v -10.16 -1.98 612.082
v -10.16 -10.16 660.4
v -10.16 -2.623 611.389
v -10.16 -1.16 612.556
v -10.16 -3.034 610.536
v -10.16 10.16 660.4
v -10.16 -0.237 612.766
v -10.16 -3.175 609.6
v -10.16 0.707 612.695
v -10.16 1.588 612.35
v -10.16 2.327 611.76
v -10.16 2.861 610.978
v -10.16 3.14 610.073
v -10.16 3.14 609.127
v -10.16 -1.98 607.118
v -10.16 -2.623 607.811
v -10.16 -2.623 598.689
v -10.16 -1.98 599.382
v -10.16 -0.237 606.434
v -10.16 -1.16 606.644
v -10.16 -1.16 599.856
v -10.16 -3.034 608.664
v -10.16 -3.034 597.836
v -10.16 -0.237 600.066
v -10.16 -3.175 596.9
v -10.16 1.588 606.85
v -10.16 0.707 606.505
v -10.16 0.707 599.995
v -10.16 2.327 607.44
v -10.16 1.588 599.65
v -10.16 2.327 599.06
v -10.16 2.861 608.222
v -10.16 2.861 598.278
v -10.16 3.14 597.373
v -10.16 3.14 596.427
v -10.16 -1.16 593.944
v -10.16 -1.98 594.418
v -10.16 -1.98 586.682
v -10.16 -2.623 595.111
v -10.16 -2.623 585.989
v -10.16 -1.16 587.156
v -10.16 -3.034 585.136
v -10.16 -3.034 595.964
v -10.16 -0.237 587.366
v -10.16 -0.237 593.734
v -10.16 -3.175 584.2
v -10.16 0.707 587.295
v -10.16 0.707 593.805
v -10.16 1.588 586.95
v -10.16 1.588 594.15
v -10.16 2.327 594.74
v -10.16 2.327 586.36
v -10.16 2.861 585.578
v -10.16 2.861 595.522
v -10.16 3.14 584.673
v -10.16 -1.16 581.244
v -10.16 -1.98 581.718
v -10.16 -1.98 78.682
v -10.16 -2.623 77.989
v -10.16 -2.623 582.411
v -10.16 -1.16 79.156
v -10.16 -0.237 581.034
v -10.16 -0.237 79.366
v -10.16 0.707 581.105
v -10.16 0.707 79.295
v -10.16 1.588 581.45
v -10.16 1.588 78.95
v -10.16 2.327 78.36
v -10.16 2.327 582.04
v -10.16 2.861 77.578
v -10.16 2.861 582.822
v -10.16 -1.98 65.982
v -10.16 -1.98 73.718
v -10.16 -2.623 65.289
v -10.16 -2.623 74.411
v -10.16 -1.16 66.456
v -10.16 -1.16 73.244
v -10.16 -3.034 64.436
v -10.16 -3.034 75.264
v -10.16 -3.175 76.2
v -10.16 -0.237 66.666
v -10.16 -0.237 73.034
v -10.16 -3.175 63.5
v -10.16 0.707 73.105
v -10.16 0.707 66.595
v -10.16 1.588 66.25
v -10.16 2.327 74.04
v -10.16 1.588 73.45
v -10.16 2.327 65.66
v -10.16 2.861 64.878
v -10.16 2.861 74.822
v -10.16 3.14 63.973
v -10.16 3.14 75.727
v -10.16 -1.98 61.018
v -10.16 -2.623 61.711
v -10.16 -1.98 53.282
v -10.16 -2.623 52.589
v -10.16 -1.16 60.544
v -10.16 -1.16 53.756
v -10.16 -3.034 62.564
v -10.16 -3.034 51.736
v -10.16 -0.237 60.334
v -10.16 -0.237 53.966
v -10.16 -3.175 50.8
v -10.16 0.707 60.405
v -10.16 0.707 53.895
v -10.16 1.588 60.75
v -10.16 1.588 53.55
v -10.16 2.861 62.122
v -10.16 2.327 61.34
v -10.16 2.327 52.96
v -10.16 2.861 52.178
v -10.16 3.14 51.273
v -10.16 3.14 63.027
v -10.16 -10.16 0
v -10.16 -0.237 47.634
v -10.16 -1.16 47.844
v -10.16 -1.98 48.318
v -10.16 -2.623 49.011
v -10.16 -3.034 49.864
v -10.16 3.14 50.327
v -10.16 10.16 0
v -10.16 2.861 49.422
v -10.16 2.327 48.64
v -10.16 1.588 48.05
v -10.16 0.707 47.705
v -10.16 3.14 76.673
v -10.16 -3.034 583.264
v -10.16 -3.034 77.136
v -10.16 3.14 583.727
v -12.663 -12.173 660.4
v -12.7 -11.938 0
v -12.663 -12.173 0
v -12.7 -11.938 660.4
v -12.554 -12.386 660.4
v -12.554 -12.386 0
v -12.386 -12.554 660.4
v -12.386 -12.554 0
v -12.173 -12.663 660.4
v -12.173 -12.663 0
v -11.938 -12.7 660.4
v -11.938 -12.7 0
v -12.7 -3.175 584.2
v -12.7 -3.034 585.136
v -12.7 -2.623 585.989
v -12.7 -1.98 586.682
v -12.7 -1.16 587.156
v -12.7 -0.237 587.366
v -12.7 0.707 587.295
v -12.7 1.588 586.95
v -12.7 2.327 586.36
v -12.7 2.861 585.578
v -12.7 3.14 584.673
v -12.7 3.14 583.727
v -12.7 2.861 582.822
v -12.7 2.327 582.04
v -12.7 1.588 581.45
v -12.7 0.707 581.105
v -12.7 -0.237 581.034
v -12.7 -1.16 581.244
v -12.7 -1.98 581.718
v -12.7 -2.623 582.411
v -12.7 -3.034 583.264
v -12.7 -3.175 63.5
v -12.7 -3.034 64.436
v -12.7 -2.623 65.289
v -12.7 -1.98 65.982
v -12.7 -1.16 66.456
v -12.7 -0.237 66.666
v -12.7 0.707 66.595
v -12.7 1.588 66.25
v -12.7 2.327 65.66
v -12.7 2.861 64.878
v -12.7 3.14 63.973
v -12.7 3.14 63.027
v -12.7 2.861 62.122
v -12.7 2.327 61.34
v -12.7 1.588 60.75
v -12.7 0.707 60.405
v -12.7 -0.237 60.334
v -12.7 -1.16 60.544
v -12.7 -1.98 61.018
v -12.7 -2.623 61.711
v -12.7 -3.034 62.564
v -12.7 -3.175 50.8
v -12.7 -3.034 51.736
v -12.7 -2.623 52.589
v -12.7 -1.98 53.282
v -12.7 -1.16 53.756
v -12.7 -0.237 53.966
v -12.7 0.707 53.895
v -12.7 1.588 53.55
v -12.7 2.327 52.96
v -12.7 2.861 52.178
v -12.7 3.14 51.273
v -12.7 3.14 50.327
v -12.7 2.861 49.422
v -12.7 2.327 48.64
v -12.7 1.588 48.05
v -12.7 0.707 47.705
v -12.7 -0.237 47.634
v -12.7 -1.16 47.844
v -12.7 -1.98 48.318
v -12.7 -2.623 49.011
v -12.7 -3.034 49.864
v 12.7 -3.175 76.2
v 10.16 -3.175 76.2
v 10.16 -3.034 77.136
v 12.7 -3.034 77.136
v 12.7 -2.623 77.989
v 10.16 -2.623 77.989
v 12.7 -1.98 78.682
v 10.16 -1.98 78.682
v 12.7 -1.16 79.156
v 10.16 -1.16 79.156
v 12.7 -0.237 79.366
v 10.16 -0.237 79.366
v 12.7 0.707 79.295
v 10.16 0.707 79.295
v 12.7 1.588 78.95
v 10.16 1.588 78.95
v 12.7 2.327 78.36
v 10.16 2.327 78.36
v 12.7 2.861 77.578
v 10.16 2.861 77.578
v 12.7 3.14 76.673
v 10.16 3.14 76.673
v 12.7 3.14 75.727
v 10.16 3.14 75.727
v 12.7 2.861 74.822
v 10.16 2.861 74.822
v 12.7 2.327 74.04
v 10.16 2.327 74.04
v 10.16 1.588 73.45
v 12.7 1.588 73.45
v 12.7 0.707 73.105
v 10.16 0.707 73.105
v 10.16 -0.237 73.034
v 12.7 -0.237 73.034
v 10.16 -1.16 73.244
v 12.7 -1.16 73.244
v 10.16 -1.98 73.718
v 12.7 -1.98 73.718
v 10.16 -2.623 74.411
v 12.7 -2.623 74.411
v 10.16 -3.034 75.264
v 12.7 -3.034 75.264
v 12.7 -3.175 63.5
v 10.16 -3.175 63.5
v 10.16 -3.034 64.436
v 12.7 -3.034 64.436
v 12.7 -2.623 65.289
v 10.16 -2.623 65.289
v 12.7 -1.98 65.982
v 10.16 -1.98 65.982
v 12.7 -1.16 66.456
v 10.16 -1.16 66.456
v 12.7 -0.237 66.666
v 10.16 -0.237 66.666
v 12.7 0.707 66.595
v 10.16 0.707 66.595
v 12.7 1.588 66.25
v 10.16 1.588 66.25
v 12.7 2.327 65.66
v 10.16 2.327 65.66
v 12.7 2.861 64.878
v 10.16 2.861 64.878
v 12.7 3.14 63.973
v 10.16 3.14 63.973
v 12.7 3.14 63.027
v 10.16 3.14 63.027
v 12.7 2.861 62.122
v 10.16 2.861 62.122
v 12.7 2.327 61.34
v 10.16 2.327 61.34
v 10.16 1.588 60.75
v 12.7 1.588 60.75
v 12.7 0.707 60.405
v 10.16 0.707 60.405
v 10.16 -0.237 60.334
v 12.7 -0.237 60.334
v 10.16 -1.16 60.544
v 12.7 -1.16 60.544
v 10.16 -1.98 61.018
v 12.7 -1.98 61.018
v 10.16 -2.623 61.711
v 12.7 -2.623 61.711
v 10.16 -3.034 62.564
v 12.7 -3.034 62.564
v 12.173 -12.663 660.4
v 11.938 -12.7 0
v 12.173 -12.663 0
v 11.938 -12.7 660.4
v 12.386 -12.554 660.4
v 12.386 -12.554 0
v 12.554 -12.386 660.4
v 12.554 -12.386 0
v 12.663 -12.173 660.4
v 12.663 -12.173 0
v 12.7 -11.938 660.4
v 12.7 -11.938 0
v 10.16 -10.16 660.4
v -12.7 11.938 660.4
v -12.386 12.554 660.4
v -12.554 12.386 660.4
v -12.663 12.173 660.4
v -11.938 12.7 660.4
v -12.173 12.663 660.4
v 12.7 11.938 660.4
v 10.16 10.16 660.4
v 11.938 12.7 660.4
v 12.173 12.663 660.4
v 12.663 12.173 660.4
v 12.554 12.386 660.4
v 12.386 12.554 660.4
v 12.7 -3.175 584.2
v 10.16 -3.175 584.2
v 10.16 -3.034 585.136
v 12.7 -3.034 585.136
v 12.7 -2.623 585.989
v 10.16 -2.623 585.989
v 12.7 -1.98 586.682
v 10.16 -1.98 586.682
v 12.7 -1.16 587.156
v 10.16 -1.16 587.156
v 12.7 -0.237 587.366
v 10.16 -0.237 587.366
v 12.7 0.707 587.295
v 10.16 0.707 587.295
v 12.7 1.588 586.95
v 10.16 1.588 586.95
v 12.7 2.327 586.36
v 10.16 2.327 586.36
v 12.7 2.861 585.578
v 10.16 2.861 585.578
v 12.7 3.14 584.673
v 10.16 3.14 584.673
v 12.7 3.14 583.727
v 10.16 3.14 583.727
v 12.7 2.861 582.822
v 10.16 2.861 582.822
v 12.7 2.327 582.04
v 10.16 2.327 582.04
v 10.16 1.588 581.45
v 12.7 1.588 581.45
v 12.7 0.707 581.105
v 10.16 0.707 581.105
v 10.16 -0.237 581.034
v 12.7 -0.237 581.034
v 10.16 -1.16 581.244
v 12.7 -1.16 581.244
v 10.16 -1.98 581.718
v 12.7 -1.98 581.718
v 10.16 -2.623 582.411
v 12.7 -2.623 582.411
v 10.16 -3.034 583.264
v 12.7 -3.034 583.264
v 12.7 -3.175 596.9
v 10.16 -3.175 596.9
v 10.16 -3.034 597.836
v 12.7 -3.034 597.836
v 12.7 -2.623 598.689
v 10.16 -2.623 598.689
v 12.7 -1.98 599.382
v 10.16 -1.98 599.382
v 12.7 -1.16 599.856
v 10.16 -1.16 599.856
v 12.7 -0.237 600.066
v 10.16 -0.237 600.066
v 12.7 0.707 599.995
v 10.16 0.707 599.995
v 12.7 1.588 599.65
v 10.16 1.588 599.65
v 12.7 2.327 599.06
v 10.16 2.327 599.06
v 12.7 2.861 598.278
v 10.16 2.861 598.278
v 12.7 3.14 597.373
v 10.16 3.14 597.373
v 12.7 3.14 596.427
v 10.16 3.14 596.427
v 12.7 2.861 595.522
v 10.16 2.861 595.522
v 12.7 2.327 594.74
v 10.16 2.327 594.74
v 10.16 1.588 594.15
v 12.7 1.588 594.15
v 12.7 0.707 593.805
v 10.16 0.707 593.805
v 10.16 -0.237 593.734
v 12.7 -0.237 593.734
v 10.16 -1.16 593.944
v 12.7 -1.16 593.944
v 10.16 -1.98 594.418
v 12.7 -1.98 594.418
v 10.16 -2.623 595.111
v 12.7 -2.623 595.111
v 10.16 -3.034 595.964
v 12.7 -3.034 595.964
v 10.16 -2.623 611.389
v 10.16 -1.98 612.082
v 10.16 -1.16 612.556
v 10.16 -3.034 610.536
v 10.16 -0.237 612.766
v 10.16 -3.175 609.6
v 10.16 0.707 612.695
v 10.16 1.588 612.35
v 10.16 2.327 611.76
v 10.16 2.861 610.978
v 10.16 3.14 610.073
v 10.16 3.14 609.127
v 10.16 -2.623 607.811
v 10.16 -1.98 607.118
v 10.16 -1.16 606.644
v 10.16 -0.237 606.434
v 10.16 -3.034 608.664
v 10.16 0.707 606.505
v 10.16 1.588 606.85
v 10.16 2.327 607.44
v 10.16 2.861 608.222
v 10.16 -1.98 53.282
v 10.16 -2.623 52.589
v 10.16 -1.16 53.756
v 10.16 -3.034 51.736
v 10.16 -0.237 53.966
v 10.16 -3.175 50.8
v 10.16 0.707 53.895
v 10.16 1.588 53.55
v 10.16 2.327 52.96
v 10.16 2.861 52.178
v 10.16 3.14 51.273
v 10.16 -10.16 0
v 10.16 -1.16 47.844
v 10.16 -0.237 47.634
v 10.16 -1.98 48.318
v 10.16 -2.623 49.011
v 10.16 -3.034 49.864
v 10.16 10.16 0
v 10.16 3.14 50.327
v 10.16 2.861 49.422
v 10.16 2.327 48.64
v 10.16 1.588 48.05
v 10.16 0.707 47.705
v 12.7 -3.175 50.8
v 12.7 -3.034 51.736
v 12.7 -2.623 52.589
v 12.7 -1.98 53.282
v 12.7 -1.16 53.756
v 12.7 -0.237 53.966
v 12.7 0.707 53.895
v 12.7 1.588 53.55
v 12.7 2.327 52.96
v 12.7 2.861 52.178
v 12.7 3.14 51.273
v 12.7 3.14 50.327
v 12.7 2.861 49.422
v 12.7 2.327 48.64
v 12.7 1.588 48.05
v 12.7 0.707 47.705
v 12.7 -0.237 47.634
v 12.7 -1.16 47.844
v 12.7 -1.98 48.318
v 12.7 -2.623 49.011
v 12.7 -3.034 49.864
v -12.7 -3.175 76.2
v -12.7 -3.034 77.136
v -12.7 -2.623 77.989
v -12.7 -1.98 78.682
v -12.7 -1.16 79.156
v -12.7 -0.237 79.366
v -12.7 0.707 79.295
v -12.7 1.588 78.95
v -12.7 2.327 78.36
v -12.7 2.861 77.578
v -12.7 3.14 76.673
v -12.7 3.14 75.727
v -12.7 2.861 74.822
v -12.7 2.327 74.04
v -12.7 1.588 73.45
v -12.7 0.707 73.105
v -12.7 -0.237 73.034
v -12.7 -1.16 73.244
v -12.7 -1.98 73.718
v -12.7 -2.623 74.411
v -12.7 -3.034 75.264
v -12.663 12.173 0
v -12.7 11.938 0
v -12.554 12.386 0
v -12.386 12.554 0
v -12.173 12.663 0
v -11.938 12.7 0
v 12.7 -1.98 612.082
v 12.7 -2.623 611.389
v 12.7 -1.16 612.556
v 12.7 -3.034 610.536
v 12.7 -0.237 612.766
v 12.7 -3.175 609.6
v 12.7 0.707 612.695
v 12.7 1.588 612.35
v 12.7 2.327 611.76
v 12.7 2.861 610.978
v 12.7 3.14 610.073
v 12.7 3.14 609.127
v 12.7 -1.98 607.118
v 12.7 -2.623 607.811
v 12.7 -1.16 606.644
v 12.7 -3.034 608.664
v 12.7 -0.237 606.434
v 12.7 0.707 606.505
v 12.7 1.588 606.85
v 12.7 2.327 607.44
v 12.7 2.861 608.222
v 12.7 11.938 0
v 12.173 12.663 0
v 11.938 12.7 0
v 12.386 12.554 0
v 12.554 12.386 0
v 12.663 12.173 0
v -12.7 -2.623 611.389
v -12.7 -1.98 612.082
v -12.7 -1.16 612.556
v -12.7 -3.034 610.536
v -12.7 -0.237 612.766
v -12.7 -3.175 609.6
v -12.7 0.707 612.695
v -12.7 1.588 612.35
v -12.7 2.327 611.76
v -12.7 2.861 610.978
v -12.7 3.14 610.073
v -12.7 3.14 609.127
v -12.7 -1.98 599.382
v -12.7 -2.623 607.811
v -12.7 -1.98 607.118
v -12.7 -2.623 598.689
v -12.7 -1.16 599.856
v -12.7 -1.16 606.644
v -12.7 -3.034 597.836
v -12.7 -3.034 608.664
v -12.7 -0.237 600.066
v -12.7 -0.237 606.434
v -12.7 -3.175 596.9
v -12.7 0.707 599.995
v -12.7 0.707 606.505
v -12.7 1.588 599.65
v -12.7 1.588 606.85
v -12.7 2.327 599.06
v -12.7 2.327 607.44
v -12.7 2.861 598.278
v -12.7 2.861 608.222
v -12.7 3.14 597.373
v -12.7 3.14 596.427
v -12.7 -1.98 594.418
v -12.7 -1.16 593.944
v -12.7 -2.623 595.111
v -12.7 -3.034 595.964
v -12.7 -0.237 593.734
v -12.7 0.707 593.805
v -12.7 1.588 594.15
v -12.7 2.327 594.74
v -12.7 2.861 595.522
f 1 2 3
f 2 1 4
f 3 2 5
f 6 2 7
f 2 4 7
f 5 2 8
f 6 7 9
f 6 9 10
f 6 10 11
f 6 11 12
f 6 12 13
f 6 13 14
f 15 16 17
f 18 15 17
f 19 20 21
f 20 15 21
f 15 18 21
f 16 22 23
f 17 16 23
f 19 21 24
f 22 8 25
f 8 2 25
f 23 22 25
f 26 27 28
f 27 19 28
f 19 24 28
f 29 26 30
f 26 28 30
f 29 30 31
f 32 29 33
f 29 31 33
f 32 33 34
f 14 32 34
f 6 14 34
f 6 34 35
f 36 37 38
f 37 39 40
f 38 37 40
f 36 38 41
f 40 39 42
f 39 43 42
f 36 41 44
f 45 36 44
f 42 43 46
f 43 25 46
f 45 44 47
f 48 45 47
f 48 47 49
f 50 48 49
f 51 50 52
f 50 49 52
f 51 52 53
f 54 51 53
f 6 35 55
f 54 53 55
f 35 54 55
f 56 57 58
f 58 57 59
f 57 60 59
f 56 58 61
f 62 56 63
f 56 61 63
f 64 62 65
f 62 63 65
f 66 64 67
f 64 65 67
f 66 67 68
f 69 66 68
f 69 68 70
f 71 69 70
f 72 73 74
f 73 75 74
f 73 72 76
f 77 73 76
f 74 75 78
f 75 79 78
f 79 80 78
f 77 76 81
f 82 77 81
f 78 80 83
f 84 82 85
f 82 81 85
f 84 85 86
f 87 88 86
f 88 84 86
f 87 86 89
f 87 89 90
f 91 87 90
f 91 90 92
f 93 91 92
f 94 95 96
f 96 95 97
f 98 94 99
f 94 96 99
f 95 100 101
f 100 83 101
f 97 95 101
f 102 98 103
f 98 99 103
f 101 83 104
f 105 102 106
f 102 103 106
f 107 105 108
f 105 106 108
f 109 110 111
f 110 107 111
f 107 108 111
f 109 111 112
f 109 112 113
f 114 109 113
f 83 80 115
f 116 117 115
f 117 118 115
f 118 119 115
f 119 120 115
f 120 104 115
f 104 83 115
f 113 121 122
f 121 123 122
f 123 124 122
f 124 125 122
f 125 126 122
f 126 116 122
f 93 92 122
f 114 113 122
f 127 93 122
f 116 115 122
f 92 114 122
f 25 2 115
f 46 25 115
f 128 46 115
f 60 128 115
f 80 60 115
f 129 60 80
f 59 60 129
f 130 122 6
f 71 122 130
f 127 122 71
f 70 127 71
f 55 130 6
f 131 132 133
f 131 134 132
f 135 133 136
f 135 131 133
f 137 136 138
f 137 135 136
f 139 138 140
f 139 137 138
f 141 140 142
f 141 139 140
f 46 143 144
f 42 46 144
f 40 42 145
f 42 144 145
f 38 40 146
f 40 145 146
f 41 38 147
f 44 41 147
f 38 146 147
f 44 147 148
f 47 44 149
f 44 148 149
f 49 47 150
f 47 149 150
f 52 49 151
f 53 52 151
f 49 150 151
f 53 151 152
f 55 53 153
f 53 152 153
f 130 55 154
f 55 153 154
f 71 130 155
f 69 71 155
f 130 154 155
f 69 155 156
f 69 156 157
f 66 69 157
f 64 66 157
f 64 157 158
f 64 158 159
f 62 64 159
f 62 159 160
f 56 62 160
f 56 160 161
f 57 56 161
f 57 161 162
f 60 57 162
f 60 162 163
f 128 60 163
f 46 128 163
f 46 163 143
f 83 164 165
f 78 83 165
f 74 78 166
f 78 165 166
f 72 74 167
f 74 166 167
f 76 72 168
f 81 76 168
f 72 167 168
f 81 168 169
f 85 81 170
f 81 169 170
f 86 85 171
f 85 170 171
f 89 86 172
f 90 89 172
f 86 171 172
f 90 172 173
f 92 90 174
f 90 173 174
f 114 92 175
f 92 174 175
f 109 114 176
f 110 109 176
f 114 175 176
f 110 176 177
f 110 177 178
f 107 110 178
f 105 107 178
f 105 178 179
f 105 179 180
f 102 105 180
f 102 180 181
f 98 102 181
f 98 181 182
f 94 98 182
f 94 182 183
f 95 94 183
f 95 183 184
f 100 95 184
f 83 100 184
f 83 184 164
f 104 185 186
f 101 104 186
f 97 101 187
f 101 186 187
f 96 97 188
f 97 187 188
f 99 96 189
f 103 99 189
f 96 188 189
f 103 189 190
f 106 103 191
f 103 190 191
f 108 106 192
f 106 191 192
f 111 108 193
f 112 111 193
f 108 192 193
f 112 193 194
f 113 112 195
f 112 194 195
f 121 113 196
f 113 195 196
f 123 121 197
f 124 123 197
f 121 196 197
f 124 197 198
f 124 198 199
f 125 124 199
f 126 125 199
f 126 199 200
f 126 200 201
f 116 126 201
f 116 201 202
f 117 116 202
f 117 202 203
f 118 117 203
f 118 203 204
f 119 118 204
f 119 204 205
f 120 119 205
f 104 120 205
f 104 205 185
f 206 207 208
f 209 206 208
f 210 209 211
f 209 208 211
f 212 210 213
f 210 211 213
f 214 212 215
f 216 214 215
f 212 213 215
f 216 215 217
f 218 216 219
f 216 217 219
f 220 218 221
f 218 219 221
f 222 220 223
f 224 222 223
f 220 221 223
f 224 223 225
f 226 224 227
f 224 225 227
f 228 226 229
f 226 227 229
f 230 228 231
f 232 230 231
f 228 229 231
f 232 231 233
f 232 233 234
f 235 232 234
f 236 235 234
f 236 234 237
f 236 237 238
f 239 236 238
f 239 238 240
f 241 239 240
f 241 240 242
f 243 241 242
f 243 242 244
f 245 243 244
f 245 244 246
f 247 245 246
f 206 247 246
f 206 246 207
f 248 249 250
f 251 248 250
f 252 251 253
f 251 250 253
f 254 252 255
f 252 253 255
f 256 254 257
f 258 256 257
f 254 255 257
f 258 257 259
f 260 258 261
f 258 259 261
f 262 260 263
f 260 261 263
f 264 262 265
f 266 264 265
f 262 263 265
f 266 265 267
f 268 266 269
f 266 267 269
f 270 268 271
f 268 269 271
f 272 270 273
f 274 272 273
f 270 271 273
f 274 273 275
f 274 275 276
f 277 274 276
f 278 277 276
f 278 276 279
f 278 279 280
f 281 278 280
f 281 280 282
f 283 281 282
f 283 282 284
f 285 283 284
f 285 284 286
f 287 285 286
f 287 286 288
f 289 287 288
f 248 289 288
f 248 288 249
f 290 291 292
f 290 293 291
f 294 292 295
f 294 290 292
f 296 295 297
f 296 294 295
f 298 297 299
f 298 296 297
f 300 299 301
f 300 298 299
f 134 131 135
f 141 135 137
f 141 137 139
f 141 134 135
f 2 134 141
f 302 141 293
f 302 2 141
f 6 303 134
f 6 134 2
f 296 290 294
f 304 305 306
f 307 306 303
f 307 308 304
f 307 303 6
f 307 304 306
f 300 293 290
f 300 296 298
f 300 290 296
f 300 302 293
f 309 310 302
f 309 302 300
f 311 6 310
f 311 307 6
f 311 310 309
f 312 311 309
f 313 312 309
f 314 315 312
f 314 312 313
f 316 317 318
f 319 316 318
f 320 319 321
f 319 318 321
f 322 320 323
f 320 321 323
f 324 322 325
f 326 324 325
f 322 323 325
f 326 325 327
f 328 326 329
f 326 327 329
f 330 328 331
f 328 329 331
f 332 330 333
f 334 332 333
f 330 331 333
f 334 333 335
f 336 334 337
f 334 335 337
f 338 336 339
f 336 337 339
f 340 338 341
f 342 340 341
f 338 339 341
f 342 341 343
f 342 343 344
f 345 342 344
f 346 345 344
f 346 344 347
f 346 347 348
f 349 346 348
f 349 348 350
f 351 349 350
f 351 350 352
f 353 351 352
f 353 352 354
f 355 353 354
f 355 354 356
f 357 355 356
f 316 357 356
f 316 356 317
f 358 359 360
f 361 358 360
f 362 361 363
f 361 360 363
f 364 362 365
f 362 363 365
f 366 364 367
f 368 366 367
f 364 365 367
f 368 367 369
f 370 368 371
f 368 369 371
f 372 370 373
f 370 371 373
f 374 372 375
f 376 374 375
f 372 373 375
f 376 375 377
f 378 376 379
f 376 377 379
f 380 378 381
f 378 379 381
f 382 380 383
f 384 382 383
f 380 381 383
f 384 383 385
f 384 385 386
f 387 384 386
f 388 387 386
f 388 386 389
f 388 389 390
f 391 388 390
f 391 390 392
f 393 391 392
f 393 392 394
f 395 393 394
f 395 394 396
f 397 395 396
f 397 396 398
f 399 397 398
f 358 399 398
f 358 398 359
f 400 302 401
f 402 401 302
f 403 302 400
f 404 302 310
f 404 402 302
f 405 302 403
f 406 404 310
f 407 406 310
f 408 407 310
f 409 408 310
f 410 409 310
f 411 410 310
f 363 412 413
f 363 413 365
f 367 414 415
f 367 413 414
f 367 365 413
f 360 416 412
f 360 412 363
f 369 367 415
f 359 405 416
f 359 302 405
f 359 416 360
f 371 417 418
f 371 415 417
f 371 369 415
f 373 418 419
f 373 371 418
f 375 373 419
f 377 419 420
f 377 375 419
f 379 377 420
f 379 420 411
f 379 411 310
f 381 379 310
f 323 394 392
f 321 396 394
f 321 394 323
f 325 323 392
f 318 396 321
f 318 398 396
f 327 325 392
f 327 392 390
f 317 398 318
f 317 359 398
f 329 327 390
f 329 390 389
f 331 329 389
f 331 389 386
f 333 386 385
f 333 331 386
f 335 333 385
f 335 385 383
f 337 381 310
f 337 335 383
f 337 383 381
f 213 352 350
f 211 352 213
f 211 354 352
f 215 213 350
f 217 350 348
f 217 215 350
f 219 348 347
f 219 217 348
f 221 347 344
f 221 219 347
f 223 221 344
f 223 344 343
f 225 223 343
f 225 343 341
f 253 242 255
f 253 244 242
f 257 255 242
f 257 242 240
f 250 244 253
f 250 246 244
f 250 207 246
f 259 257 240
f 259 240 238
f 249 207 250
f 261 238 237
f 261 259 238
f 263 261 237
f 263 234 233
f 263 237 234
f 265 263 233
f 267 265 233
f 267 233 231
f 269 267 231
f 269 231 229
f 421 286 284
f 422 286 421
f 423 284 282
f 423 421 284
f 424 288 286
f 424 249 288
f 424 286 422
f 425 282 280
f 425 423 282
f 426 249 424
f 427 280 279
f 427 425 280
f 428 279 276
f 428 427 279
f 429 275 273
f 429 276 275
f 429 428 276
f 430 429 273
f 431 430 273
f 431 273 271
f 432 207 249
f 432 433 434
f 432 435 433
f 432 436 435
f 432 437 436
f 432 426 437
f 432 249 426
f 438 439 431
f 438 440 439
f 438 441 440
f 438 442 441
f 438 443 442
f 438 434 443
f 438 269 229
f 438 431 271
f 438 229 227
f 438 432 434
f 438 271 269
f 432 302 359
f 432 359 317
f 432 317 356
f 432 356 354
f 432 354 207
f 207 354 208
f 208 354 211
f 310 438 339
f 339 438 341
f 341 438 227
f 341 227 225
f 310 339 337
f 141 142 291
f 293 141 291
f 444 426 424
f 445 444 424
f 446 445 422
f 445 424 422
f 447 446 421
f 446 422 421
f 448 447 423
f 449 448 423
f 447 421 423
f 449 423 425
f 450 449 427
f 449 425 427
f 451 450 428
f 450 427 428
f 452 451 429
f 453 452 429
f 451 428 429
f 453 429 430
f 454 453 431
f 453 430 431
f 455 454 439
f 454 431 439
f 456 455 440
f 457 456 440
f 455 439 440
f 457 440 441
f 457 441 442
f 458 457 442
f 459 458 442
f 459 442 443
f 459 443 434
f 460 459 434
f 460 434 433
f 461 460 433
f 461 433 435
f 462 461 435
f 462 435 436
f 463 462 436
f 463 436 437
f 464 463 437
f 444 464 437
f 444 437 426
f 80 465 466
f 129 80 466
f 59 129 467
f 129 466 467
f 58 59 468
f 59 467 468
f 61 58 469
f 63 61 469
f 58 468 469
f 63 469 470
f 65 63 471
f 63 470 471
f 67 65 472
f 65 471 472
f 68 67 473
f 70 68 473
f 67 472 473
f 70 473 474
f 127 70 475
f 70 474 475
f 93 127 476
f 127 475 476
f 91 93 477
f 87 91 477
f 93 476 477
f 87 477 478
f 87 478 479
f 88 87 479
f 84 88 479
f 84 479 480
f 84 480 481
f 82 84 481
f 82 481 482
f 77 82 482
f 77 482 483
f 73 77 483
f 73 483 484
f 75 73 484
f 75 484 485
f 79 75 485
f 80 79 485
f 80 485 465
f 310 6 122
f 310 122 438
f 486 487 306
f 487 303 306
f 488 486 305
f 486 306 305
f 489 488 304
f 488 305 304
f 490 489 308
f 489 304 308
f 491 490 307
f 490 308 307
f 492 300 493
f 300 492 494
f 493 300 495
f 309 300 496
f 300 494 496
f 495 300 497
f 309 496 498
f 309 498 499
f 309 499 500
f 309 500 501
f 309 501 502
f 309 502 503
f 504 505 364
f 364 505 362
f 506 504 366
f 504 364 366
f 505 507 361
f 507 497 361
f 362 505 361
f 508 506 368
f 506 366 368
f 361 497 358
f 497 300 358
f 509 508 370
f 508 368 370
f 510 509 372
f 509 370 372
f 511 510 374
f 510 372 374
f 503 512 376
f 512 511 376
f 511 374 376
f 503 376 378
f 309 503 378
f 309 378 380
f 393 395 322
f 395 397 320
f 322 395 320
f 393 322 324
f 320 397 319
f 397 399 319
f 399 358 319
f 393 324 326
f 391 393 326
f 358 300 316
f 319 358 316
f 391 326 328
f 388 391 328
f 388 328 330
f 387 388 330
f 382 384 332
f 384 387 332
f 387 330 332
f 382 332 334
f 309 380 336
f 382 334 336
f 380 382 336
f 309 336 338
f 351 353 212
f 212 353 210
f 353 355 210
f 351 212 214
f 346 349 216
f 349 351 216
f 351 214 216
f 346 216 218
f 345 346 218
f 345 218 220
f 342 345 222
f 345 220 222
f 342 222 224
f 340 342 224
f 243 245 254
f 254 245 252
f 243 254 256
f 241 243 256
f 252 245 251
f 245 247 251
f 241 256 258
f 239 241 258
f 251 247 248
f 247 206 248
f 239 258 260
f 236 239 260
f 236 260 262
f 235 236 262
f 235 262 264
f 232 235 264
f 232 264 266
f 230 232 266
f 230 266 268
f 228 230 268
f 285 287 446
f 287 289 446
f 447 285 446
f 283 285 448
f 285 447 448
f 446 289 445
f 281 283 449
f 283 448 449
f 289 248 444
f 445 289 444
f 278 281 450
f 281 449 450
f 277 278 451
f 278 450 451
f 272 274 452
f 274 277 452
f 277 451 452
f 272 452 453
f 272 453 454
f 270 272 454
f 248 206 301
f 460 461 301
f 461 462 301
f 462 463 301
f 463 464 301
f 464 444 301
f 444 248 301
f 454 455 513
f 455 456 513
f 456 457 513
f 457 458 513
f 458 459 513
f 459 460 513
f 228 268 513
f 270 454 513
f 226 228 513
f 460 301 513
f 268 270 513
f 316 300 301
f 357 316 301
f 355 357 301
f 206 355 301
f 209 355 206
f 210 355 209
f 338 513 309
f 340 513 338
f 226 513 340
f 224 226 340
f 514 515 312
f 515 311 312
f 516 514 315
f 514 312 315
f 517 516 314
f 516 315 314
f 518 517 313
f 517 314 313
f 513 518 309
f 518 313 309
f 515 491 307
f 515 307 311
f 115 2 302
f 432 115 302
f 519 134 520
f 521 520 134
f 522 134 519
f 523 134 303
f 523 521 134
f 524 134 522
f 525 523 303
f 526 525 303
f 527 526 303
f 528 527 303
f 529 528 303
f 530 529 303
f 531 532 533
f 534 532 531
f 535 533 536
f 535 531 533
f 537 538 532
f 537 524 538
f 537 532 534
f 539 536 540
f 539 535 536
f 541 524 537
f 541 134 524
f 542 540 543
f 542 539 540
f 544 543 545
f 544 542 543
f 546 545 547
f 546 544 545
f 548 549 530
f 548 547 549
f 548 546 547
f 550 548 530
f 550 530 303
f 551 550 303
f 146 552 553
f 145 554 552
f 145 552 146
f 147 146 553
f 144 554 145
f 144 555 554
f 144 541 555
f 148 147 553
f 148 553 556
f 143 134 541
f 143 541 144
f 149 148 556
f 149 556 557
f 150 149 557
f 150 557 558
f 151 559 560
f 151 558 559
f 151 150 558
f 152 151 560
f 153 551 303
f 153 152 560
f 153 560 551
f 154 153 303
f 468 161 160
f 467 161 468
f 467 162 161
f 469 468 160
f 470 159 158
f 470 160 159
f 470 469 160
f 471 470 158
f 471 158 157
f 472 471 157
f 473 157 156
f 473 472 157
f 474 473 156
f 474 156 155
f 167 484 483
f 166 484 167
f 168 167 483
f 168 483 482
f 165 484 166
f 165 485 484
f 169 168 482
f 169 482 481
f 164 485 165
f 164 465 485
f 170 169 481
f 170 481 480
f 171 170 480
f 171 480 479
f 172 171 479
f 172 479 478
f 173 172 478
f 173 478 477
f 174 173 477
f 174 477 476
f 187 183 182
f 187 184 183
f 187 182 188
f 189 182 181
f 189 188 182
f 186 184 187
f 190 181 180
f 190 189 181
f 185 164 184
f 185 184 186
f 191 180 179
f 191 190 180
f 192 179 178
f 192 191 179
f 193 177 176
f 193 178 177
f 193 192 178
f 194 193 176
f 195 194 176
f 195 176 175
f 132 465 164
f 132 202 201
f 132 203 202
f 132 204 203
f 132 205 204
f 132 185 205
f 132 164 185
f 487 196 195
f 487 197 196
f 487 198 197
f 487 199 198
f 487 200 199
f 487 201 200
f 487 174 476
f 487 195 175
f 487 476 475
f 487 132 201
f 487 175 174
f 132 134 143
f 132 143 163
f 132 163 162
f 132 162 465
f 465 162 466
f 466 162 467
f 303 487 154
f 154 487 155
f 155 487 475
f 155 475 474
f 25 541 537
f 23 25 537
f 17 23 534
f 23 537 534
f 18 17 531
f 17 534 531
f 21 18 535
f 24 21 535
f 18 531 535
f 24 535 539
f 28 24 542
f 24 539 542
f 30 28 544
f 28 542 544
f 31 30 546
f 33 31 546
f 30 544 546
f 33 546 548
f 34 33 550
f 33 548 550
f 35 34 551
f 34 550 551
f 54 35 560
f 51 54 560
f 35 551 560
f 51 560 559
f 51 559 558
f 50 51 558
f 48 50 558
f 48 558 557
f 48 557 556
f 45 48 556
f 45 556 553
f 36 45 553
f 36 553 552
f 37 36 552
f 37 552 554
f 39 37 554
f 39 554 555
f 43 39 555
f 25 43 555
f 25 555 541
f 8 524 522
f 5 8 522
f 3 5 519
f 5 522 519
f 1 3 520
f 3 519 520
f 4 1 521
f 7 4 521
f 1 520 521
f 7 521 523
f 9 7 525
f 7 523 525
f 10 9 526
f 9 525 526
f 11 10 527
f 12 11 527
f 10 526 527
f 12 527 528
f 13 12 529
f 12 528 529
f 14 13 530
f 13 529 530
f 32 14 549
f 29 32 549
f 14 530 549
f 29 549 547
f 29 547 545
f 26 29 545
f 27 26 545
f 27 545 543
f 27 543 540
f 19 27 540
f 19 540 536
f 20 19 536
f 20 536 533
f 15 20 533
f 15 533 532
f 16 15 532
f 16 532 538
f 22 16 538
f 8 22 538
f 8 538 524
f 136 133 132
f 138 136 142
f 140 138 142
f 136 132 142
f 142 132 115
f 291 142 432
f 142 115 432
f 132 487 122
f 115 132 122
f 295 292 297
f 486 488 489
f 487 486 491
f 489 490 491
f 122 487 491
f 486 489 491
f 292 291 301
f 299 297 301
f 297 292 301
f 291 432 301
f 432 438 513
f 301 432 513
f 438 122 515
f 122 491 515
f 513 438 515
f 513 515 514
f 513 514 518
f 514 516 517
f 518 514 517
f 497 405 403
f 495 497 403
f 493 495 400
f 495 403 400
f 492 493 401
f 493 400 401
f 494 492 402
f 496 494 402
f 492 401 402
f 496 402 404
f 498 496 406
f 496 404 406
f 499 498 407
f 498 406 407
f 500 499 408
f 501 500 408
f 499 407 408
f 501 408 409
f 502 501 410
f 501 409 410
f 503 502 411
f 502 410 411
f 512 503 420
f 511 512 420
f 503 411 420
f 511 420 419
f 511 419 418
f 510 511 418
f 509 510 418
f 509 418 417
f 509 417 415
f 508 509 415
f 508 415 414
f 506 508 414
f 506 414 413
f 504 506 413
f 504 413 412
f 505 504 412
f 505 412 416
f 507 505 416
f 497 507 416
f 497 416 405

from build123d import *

# Parameters (mm, degrees)
F0_W     = 25.4
F0_H     = 25.4
F0_W_2   = 20.32
F0_H_2   = 20.32
F1_DEPTH = 660.4
F4_D     = 6.35
F5_R     = 0.762


with BuildPart() as f1:
    # F0 (on Top) → F1 (new body)
    with BuildSketch(Plane.XY):
        Rectangle(F0_W, F0_H)
        Rectangle(F0_W_2, F0_H_2, mode=Mode.SUBTRACT)
    extrude(amount=F1_DEPTH)

    # F4 (through all)
    with Locations(Plane.YZ.offset(12.7)):
        with Locations((0, 609.6), (0, 596.9), (0, 584.2), (0, 76.2), (0, 63.5), (0, 50.8)):
            Hole(F4_D / 2)

    # F5
    f5_edges = [f1.edges().sort_by_distance(p)[0] for p in [
        (12.7, 12.7, 330.2),
        (-12.7, 12.7, 330.2),
        (12.7, -12.7, 330.2),
        (-12.7, -12.7, 330.2),
    ]]
    fillet(f5_edges, radius=F5_R)


solid = f1.part
